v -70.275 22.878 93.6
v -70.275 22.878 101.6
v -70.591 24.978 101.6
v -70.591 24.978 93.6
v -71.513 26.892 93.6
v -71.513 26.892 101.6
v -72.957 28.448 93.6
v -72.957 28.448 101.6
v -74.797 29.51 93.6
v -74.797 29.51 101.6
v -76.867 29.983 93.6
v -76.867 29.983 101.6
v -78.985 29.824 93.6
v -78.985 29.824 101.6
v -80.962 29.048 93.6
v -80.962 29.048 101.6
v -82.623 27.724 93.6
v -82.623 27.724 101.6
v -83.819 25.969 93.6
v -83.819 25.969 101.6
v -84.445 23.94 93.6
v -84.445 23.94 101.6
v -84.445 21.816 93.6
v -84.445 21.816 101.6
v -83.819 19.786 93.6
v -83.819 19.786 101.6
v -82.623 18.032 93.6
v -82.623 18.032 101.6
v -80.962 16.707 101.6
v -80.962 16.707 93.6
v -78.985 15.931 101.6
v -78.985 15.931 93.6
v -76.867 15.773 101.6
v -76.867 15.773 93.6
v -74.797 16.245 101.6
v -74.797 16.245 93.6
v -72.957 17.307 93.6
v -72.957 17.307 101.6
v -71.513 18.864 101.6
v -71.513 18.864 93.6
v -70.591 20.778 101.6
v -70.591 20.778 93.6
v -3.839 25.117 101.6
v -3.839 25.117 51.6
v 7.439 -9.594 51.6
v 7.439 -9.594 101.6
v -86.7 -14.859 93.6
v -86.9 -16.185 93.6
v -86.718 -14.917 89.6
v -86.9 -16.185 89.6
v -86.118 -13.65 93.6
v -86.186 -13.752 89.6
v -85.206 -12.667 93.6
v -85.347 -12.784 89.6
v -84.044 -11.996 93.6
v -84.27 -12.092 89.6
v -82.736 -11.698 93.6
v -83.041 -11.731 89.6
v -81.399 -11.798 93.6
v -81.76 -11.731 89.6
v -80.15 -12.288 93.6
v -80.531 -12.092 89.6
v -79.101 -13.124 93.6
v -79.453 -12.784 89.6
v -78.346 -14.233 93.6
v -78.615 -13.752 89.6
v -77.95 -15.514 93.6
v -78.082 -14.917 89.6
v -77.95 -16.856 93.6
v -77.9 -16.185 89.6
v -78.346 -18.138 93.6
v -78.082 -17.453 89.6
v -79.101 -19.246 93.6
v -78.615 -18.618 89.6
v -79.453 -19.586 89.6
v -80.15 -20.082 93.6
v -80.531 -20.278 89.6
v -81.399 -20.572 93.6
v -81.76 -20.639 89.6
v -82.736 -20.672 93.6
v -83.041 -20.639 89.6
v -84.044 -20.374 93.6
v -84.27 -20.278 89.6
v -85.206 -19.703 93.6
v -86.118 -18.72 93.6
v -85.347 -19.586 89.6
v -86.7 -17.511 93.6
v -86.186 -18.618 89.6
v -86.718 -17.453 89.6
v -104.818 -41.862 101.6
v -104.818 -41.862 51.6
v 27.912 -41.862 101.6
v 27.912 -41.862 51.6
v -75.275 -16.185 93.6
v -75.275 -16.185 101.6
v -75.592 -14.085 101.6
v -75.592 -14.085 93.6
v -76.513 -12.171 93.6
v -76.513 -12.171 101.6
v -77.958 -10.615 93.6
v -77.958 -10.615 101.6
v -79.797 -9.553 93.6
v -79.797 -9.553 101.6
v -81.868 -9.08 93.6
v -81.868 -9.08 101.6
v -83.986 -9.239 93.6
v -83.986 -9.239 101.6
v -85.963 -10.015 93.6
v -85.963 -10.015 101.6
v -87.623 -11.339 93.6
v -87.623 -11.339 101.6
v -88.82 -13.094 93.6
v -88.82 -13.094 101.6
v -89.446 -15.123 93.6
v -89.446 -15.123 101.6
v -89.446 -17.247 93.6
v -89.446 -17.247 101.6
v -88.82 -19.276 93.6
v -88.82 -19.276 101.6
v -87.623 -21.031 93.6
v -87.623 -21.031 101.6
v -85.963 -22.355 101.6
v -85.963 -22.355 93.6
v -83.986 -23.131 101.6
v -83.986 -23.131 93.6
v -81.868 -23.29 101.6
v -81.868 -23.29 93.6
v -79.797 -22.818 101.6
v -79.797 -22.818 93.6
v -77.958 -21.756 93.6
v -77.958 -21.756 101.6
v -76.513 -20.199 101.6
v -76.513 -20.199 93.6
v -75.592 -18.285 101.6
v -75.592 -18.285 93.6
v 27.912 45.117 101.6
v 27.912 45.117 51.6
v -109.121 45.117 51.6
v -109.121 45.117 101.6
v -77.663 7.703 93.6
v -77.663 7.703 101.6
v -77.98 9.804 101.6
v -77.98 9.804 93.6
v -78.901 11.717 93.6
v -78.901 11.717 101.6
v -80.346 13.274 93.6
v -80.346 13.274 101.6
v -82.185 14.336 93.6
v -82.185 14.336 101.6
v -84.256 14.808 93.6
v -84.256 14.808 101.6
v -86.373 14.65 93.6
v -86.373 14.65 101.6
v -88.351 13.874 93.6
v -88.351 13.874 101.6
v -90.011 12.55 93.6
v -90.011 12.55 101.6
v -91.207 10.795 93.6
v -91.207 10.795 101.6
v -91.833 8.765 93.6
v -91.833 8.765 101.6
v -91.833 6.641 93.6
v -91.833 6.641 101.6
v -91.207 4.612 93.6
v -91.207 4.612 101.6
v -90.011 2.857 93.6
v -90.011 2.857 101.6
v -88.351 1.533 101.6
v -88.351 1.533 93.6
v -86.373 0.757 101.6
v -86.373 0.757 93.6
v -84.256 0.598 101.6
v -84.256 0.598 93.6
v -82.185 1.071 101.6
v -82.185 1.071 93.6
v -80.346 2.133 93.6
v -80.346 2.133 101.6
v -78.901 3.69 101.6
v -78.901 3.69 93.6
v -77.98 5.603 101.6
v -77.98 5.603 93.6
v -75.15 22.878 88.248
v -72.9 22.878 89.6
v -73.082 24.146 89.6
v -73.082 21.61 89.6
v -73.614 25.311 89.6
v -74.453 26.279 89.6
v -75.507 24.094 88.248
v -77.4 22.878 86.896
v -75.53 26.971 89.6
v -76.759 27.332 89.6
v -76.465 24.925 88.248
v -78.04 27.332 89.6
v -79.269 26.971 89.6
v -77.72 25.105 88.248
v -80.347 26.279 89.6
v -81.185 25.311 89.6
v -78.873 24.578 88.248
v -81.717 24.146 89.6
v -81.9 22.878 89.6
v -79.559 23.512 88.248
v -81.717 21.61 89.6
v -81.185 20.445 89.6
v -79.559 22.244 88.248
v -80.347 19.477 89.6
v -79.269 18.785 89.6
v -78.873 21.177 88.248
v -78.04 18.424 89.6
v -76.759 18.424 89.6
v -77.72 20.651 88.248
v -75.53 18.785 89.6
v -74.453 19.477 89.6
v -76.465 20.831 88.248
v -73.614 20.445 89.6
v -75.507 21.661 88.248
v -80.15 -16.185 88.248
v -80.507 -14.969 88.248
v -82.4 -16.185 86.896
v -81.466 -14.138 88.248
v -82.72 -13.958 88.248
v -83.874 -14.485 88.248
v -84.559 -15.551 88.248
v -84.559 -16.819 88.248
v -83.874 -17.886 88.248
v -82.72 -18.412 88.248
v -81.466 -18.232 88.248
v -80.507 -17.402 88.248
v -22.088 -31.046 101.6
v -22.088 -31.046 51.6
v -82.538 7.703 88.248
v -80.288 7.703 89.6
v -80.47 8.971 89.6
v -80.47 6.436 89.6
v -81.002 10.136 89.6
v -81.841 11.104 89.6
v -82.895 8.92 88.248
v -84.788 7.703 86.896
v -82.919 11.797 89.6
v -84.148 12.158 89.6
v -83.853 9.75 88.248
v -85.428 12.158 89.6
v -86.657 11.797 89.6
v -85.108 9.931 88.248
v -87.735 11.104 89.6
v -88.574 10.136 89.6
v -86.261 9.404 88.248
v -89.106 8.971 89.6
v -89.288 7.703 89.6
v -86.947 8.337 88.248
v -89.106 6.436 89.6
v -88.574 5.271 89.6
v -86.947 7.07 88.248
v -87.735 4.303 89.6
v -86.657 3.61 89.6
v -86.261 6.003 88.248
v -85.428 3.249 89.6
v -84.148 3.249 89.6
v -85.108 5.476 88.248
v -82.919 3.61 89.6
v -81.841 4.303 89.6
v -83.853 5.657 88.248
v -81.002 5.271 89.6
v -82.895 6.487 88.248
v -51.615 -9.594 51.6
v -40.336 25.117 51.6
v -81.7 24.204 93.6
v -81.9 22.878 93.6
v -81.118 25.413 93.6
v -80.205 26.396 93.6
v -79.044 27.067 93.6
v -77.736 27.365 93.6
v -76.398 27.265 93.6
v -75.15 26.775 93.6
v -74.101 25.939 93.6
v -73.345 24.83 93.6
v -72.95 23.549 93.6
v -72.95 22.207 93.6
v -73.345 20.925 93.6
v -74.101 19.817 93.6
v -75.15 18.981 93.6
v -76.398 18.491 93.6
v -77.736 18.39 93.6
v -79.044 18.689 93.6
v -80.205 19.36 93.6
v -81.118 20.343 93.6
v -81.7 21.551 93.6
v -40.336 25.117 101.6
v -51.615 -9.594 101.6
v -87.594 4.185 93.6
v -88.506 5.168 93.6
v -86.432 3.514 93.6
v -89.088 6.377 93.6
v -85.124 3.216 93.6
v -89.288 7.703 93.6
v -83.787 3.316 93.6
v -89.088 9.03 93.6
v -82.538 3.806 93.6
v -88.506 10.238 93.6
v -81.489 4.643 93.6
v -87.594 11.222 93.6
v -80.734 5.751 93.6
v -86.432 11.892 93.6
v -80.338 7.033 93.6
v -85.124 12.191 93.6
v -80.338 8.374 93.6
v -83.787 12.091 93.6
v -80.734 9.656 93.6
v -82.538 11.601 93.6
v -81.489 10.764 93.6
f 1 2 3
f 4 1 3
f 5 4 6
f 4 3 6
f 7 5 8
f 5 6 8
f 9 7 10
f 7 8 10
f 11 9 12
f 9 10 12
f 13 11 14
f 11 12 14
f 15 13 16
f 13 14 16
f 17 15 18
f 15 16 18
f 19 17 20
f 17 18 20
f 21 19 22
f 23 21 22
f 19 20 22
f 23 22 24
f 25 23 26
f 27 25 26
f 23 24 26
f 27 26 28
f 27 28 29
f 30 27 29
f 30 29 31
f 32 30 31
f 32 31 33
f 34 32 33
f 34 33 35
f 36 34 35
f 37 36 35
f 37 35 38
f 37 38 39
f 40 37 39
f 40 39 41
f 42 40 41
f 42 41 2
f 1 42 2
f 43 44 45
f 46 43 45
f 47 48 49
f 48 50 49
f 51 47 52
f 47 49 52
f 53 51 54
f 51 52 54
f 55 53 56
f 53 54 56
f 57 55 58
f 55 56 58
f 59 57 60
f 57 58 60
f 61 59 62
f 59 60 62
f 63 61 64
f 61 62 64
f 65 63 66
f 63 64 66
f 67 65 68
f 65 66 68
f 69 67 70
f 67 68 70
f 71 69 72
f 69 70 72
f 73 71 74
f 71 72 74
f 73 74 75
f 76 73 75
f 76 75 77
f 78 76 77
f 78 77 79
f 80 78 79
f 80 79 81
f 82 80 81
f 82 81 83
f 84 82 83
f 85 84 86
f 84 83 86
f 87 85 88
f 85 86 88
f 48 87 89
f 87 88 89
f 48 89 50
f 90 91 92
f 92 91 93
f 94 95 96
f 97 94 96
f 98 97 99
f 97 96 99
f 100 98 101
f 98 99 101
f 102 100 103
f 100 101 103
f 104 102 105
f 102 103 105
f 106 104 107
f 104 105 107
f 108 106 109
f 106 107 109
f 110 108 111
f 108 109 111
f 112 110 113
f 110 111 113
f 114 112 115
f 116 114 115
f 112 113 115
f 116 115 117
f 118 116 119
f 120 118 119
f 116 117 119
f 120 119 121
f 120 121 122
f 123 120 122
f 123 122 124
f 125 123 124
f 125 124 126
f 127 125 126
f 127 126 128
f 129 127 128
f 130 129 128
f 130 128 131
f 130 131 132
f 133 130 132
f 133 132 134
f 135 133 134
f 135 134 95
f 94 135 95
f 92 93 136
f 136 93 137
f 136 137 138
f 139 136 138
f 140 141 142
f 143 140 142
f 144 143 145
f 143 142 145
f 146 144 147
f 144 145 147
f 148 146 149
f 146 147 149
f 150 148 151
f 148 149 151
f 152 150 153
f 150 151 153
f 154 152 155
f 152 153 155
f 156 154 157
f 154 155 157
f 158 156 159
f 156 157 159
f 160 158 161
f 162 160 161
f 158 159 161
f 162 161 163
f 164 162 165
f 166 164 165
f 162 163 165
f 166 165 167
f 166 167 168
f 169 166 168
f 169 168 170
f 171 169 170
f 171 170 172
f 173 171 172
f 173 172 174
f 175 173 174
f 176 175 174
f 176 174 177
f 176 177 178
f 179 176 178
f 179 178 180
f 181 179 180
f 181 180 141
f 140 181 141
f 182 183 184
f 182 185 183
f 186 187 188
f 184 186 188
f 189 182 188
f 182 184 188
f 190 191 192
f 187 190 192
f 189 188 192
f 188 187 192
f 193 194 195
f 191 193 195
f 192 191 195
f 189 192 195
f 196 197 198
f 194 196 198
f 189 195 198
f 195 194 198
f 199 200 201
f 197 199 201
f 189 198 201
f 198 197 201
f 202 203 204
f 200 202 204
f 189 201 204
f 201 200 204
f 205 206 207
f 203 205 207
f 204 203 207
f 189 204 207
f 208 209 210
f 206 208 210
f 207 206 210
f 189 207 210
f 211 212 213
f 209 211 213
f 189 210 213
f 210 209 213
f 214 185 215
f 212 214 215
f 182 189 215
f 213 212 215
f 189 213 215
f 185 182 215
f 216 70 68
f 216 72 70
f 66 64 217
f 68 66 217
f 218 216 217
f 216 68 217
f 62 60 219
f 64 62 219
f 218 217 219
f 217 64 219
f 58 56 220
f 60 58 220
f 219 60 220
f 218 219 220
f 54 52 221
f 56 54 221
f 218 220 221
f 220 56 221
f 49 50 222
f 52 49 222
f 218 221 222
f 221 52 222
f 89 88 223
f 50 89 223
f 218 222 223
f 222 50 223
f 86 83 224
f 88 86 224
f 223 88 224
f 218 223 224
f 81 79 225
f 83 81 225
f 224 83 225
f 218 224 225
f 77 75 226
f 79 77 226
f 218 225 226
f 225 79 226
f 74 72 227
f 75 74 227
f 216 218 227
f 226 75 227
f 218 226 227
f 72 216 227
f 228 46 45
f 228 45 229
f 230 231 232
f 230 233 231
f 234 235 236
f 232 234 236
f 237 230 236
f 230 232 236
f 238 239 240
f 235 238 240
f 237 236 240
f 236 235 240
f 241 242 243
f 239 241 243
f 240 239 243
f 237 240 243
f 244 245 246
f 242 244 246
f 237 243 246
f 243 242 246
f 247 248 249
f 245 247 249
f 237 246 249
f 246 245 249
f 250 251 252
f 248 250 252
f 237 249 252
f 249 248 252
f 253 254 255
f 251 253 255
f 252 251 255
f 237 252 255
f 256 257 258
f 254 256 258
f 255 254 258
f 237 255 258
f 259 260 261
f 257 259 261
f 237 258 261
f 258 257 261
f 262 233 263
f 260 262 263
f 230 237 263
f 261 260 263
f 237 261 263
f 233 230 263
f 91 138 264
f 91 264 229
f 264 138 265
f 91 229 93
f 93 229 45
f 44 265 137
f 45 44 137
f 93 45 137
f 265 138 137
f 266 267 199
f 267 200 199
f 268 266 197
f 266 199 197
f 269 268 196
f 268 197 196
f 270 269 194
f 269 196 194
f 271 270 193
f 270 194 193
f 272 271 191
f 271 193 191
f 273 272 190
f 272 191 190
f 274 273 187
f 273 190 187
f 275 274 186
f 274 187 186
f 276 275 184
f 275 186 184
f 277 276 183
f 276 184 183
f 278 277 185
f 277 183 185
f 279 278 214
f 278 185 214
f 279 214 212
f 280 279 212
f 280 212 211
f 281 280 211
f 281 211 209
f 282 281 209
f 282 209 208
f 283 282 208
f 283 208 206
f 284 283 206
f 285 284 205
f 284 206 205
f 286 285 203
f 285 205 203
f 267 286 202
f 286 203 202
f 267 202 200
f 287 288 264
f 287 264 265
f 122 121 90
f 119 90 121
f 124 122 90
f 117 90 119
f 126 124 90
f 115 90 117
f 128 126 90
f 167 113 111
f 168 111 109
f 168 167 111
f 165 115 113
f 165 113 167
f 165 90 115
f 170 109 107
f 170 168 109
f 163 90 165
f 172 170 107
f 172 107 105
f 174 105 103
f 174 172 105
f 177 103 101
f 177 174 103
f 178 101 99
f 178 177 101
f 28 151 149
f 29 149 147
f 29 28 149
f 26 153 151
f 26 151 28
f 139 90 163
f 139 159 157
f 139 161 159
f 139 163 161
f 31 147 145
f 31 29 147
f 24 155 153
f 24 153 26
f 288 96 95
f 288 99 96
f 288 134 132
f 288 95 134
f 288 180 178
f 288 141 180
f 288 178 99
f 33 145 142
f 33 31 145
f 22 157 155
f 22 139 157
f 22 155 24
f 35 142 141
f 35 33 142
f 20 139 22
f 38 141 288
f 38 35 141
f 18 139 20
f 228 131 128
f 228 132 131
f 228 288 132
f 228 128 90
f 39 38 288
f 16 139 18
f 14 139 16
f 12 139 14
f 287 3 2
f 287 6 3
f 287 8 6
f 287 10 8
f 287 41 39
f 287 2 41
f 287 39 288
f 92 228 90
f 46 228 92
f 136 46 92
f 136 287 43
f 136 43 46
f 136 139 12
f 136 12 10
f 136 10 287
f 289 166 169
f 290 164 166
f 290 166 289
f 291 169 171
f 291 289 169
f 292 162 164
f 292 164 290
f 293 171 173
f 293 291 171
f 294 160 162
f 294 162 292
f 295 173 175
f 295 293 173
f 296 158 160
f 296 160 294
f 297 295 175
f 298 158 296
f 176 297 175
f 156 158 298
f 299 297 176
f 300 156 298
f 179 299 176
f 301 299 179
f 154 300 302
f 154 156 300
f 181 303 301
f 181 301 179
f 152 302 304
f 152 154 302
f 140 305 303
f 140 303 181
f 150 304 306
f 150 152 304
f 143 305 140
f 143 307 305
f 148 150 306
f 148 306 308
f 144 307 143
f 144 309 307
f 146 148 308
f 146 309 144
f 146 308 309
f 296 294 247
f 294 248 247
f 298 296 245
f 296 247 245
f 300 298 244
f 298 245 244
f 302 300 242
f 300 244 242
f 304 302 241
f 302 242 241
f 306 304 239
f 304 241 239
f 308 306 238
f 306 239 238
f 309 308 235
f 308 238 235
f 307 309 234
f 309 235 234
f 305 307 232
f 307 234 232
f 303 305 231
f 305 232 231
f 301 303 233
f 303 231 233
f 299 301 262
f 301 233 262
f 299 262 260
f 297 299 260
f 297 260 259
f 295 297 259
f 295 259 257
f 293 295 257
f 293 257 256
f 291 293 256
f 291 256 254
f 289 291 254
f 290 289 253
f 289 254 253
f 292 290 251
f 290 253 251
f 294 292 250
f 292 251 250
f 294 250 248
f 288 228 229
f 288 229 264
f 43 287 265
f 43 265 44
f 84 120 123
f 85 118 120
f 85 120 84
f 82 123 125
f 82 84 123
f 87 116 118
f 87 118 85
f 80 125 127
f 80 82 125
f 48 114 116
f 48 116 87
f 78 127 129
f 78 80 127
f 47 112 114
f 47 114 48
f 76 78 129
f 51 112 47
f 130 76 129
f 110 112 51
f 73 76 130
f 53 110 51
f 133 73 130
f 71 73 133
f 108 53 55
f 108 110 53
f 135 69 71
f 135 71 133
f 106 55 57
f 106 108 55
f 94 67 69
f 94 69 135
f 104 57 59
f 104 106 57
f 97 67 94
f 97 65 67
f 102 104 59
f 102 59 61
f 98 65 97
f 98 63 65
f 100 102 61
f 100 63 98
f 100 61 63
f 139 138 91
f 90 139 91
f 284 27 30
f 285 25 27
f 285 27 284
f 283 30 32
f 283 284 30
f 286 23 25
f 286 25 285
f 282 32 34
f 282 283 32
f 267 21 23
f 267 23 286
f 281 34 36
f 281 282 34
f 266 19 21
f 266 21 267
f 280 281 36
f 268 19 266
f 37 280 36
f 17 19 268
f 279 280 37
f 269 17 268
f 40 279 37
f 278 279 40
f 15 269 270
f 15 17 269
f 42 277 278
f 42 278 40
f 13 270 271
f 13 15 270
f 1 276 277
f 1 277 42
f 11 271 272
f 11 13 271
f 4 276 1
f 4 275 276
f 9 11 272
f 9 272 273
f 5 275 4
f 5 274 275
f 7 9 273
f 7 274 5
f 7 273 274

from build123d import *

# Parameters (mm, degrees)
F1_DEPTH       = 101.6
F5_DEPTH       = 50
F7_D           = 9
F7_DEPTH       = 12
F7_CBORE_D     = 14.25
F7_CBORE_DEPTH = 8
F7_TIP         = 2.7038727856


with BuildPart() as f1:
    # F0 (on Top) → F1 (new body)
    with BuildSketch(Plane.XY):
        Polygon((-109.12142694, 45.1170913875), (-104.8183739185, -41.8617390096), (27.9122088104, -41.8617390096), (27.9122088104, 45.1170913875), align=None)
    extrude(amount=F1_DEPTH)

    # F2 (on face) → F3 (revolve)
    with BuildSketch(Plane.XZ.offset(41.8617390096)):
        Polygon((-104.8183739185, 0), (-104.8183739185, 50.8), (-134.8183739185, 50.8), (-107.7620375156, 0), align=None)
    revolve(axis=Axis((27.9122088104, -41.8617390096, 50.8), (0, 0, -1)))

    # F4 (on face) → F5 (intersect)
    with BuildSketch(Plane.XY.offset(101.6)):
        Polygon((27.9122088104, 45.1170913875), (-109.12142694, 45.1170913875), (-104.8183739185, -41.8617390096), (27.9122088104, -41.8617390096), align=None)
        Polygon((-51.6147029857, -9.5938752115), (-40.3364262624, 25.1170913875), (-3.8391561167, 25.1170913875), (7.4391206066, -9.5938752115), (-22.0877911896, -31.046432352), align=None, mode=Mode.SUBTRACT)
    extrude(amount=-F5_DEPTH, mode=Mode.INTERSECT)

    # F7
    with Locations(Plane.XY.offset(101.6)):
        with Locations((-82.40018785, -16.1850638688), (-84.7880318761, 7.7034095302), (-77.399738133, 22.8778515011)):
            CounterBoreHole(F7_D / 2, F7_CBORE_D / 2, F7_CBORE_DEPTH, depth=F7_DEPTH)
            with Locations((0, 0, -(F7_DEPTH + F7_TIP / 2))):  # 118° drill point
                Cone(0, F7_D / 2, F7_TIP, mode=Mode.SUBTRACT)


solid = f1.part
